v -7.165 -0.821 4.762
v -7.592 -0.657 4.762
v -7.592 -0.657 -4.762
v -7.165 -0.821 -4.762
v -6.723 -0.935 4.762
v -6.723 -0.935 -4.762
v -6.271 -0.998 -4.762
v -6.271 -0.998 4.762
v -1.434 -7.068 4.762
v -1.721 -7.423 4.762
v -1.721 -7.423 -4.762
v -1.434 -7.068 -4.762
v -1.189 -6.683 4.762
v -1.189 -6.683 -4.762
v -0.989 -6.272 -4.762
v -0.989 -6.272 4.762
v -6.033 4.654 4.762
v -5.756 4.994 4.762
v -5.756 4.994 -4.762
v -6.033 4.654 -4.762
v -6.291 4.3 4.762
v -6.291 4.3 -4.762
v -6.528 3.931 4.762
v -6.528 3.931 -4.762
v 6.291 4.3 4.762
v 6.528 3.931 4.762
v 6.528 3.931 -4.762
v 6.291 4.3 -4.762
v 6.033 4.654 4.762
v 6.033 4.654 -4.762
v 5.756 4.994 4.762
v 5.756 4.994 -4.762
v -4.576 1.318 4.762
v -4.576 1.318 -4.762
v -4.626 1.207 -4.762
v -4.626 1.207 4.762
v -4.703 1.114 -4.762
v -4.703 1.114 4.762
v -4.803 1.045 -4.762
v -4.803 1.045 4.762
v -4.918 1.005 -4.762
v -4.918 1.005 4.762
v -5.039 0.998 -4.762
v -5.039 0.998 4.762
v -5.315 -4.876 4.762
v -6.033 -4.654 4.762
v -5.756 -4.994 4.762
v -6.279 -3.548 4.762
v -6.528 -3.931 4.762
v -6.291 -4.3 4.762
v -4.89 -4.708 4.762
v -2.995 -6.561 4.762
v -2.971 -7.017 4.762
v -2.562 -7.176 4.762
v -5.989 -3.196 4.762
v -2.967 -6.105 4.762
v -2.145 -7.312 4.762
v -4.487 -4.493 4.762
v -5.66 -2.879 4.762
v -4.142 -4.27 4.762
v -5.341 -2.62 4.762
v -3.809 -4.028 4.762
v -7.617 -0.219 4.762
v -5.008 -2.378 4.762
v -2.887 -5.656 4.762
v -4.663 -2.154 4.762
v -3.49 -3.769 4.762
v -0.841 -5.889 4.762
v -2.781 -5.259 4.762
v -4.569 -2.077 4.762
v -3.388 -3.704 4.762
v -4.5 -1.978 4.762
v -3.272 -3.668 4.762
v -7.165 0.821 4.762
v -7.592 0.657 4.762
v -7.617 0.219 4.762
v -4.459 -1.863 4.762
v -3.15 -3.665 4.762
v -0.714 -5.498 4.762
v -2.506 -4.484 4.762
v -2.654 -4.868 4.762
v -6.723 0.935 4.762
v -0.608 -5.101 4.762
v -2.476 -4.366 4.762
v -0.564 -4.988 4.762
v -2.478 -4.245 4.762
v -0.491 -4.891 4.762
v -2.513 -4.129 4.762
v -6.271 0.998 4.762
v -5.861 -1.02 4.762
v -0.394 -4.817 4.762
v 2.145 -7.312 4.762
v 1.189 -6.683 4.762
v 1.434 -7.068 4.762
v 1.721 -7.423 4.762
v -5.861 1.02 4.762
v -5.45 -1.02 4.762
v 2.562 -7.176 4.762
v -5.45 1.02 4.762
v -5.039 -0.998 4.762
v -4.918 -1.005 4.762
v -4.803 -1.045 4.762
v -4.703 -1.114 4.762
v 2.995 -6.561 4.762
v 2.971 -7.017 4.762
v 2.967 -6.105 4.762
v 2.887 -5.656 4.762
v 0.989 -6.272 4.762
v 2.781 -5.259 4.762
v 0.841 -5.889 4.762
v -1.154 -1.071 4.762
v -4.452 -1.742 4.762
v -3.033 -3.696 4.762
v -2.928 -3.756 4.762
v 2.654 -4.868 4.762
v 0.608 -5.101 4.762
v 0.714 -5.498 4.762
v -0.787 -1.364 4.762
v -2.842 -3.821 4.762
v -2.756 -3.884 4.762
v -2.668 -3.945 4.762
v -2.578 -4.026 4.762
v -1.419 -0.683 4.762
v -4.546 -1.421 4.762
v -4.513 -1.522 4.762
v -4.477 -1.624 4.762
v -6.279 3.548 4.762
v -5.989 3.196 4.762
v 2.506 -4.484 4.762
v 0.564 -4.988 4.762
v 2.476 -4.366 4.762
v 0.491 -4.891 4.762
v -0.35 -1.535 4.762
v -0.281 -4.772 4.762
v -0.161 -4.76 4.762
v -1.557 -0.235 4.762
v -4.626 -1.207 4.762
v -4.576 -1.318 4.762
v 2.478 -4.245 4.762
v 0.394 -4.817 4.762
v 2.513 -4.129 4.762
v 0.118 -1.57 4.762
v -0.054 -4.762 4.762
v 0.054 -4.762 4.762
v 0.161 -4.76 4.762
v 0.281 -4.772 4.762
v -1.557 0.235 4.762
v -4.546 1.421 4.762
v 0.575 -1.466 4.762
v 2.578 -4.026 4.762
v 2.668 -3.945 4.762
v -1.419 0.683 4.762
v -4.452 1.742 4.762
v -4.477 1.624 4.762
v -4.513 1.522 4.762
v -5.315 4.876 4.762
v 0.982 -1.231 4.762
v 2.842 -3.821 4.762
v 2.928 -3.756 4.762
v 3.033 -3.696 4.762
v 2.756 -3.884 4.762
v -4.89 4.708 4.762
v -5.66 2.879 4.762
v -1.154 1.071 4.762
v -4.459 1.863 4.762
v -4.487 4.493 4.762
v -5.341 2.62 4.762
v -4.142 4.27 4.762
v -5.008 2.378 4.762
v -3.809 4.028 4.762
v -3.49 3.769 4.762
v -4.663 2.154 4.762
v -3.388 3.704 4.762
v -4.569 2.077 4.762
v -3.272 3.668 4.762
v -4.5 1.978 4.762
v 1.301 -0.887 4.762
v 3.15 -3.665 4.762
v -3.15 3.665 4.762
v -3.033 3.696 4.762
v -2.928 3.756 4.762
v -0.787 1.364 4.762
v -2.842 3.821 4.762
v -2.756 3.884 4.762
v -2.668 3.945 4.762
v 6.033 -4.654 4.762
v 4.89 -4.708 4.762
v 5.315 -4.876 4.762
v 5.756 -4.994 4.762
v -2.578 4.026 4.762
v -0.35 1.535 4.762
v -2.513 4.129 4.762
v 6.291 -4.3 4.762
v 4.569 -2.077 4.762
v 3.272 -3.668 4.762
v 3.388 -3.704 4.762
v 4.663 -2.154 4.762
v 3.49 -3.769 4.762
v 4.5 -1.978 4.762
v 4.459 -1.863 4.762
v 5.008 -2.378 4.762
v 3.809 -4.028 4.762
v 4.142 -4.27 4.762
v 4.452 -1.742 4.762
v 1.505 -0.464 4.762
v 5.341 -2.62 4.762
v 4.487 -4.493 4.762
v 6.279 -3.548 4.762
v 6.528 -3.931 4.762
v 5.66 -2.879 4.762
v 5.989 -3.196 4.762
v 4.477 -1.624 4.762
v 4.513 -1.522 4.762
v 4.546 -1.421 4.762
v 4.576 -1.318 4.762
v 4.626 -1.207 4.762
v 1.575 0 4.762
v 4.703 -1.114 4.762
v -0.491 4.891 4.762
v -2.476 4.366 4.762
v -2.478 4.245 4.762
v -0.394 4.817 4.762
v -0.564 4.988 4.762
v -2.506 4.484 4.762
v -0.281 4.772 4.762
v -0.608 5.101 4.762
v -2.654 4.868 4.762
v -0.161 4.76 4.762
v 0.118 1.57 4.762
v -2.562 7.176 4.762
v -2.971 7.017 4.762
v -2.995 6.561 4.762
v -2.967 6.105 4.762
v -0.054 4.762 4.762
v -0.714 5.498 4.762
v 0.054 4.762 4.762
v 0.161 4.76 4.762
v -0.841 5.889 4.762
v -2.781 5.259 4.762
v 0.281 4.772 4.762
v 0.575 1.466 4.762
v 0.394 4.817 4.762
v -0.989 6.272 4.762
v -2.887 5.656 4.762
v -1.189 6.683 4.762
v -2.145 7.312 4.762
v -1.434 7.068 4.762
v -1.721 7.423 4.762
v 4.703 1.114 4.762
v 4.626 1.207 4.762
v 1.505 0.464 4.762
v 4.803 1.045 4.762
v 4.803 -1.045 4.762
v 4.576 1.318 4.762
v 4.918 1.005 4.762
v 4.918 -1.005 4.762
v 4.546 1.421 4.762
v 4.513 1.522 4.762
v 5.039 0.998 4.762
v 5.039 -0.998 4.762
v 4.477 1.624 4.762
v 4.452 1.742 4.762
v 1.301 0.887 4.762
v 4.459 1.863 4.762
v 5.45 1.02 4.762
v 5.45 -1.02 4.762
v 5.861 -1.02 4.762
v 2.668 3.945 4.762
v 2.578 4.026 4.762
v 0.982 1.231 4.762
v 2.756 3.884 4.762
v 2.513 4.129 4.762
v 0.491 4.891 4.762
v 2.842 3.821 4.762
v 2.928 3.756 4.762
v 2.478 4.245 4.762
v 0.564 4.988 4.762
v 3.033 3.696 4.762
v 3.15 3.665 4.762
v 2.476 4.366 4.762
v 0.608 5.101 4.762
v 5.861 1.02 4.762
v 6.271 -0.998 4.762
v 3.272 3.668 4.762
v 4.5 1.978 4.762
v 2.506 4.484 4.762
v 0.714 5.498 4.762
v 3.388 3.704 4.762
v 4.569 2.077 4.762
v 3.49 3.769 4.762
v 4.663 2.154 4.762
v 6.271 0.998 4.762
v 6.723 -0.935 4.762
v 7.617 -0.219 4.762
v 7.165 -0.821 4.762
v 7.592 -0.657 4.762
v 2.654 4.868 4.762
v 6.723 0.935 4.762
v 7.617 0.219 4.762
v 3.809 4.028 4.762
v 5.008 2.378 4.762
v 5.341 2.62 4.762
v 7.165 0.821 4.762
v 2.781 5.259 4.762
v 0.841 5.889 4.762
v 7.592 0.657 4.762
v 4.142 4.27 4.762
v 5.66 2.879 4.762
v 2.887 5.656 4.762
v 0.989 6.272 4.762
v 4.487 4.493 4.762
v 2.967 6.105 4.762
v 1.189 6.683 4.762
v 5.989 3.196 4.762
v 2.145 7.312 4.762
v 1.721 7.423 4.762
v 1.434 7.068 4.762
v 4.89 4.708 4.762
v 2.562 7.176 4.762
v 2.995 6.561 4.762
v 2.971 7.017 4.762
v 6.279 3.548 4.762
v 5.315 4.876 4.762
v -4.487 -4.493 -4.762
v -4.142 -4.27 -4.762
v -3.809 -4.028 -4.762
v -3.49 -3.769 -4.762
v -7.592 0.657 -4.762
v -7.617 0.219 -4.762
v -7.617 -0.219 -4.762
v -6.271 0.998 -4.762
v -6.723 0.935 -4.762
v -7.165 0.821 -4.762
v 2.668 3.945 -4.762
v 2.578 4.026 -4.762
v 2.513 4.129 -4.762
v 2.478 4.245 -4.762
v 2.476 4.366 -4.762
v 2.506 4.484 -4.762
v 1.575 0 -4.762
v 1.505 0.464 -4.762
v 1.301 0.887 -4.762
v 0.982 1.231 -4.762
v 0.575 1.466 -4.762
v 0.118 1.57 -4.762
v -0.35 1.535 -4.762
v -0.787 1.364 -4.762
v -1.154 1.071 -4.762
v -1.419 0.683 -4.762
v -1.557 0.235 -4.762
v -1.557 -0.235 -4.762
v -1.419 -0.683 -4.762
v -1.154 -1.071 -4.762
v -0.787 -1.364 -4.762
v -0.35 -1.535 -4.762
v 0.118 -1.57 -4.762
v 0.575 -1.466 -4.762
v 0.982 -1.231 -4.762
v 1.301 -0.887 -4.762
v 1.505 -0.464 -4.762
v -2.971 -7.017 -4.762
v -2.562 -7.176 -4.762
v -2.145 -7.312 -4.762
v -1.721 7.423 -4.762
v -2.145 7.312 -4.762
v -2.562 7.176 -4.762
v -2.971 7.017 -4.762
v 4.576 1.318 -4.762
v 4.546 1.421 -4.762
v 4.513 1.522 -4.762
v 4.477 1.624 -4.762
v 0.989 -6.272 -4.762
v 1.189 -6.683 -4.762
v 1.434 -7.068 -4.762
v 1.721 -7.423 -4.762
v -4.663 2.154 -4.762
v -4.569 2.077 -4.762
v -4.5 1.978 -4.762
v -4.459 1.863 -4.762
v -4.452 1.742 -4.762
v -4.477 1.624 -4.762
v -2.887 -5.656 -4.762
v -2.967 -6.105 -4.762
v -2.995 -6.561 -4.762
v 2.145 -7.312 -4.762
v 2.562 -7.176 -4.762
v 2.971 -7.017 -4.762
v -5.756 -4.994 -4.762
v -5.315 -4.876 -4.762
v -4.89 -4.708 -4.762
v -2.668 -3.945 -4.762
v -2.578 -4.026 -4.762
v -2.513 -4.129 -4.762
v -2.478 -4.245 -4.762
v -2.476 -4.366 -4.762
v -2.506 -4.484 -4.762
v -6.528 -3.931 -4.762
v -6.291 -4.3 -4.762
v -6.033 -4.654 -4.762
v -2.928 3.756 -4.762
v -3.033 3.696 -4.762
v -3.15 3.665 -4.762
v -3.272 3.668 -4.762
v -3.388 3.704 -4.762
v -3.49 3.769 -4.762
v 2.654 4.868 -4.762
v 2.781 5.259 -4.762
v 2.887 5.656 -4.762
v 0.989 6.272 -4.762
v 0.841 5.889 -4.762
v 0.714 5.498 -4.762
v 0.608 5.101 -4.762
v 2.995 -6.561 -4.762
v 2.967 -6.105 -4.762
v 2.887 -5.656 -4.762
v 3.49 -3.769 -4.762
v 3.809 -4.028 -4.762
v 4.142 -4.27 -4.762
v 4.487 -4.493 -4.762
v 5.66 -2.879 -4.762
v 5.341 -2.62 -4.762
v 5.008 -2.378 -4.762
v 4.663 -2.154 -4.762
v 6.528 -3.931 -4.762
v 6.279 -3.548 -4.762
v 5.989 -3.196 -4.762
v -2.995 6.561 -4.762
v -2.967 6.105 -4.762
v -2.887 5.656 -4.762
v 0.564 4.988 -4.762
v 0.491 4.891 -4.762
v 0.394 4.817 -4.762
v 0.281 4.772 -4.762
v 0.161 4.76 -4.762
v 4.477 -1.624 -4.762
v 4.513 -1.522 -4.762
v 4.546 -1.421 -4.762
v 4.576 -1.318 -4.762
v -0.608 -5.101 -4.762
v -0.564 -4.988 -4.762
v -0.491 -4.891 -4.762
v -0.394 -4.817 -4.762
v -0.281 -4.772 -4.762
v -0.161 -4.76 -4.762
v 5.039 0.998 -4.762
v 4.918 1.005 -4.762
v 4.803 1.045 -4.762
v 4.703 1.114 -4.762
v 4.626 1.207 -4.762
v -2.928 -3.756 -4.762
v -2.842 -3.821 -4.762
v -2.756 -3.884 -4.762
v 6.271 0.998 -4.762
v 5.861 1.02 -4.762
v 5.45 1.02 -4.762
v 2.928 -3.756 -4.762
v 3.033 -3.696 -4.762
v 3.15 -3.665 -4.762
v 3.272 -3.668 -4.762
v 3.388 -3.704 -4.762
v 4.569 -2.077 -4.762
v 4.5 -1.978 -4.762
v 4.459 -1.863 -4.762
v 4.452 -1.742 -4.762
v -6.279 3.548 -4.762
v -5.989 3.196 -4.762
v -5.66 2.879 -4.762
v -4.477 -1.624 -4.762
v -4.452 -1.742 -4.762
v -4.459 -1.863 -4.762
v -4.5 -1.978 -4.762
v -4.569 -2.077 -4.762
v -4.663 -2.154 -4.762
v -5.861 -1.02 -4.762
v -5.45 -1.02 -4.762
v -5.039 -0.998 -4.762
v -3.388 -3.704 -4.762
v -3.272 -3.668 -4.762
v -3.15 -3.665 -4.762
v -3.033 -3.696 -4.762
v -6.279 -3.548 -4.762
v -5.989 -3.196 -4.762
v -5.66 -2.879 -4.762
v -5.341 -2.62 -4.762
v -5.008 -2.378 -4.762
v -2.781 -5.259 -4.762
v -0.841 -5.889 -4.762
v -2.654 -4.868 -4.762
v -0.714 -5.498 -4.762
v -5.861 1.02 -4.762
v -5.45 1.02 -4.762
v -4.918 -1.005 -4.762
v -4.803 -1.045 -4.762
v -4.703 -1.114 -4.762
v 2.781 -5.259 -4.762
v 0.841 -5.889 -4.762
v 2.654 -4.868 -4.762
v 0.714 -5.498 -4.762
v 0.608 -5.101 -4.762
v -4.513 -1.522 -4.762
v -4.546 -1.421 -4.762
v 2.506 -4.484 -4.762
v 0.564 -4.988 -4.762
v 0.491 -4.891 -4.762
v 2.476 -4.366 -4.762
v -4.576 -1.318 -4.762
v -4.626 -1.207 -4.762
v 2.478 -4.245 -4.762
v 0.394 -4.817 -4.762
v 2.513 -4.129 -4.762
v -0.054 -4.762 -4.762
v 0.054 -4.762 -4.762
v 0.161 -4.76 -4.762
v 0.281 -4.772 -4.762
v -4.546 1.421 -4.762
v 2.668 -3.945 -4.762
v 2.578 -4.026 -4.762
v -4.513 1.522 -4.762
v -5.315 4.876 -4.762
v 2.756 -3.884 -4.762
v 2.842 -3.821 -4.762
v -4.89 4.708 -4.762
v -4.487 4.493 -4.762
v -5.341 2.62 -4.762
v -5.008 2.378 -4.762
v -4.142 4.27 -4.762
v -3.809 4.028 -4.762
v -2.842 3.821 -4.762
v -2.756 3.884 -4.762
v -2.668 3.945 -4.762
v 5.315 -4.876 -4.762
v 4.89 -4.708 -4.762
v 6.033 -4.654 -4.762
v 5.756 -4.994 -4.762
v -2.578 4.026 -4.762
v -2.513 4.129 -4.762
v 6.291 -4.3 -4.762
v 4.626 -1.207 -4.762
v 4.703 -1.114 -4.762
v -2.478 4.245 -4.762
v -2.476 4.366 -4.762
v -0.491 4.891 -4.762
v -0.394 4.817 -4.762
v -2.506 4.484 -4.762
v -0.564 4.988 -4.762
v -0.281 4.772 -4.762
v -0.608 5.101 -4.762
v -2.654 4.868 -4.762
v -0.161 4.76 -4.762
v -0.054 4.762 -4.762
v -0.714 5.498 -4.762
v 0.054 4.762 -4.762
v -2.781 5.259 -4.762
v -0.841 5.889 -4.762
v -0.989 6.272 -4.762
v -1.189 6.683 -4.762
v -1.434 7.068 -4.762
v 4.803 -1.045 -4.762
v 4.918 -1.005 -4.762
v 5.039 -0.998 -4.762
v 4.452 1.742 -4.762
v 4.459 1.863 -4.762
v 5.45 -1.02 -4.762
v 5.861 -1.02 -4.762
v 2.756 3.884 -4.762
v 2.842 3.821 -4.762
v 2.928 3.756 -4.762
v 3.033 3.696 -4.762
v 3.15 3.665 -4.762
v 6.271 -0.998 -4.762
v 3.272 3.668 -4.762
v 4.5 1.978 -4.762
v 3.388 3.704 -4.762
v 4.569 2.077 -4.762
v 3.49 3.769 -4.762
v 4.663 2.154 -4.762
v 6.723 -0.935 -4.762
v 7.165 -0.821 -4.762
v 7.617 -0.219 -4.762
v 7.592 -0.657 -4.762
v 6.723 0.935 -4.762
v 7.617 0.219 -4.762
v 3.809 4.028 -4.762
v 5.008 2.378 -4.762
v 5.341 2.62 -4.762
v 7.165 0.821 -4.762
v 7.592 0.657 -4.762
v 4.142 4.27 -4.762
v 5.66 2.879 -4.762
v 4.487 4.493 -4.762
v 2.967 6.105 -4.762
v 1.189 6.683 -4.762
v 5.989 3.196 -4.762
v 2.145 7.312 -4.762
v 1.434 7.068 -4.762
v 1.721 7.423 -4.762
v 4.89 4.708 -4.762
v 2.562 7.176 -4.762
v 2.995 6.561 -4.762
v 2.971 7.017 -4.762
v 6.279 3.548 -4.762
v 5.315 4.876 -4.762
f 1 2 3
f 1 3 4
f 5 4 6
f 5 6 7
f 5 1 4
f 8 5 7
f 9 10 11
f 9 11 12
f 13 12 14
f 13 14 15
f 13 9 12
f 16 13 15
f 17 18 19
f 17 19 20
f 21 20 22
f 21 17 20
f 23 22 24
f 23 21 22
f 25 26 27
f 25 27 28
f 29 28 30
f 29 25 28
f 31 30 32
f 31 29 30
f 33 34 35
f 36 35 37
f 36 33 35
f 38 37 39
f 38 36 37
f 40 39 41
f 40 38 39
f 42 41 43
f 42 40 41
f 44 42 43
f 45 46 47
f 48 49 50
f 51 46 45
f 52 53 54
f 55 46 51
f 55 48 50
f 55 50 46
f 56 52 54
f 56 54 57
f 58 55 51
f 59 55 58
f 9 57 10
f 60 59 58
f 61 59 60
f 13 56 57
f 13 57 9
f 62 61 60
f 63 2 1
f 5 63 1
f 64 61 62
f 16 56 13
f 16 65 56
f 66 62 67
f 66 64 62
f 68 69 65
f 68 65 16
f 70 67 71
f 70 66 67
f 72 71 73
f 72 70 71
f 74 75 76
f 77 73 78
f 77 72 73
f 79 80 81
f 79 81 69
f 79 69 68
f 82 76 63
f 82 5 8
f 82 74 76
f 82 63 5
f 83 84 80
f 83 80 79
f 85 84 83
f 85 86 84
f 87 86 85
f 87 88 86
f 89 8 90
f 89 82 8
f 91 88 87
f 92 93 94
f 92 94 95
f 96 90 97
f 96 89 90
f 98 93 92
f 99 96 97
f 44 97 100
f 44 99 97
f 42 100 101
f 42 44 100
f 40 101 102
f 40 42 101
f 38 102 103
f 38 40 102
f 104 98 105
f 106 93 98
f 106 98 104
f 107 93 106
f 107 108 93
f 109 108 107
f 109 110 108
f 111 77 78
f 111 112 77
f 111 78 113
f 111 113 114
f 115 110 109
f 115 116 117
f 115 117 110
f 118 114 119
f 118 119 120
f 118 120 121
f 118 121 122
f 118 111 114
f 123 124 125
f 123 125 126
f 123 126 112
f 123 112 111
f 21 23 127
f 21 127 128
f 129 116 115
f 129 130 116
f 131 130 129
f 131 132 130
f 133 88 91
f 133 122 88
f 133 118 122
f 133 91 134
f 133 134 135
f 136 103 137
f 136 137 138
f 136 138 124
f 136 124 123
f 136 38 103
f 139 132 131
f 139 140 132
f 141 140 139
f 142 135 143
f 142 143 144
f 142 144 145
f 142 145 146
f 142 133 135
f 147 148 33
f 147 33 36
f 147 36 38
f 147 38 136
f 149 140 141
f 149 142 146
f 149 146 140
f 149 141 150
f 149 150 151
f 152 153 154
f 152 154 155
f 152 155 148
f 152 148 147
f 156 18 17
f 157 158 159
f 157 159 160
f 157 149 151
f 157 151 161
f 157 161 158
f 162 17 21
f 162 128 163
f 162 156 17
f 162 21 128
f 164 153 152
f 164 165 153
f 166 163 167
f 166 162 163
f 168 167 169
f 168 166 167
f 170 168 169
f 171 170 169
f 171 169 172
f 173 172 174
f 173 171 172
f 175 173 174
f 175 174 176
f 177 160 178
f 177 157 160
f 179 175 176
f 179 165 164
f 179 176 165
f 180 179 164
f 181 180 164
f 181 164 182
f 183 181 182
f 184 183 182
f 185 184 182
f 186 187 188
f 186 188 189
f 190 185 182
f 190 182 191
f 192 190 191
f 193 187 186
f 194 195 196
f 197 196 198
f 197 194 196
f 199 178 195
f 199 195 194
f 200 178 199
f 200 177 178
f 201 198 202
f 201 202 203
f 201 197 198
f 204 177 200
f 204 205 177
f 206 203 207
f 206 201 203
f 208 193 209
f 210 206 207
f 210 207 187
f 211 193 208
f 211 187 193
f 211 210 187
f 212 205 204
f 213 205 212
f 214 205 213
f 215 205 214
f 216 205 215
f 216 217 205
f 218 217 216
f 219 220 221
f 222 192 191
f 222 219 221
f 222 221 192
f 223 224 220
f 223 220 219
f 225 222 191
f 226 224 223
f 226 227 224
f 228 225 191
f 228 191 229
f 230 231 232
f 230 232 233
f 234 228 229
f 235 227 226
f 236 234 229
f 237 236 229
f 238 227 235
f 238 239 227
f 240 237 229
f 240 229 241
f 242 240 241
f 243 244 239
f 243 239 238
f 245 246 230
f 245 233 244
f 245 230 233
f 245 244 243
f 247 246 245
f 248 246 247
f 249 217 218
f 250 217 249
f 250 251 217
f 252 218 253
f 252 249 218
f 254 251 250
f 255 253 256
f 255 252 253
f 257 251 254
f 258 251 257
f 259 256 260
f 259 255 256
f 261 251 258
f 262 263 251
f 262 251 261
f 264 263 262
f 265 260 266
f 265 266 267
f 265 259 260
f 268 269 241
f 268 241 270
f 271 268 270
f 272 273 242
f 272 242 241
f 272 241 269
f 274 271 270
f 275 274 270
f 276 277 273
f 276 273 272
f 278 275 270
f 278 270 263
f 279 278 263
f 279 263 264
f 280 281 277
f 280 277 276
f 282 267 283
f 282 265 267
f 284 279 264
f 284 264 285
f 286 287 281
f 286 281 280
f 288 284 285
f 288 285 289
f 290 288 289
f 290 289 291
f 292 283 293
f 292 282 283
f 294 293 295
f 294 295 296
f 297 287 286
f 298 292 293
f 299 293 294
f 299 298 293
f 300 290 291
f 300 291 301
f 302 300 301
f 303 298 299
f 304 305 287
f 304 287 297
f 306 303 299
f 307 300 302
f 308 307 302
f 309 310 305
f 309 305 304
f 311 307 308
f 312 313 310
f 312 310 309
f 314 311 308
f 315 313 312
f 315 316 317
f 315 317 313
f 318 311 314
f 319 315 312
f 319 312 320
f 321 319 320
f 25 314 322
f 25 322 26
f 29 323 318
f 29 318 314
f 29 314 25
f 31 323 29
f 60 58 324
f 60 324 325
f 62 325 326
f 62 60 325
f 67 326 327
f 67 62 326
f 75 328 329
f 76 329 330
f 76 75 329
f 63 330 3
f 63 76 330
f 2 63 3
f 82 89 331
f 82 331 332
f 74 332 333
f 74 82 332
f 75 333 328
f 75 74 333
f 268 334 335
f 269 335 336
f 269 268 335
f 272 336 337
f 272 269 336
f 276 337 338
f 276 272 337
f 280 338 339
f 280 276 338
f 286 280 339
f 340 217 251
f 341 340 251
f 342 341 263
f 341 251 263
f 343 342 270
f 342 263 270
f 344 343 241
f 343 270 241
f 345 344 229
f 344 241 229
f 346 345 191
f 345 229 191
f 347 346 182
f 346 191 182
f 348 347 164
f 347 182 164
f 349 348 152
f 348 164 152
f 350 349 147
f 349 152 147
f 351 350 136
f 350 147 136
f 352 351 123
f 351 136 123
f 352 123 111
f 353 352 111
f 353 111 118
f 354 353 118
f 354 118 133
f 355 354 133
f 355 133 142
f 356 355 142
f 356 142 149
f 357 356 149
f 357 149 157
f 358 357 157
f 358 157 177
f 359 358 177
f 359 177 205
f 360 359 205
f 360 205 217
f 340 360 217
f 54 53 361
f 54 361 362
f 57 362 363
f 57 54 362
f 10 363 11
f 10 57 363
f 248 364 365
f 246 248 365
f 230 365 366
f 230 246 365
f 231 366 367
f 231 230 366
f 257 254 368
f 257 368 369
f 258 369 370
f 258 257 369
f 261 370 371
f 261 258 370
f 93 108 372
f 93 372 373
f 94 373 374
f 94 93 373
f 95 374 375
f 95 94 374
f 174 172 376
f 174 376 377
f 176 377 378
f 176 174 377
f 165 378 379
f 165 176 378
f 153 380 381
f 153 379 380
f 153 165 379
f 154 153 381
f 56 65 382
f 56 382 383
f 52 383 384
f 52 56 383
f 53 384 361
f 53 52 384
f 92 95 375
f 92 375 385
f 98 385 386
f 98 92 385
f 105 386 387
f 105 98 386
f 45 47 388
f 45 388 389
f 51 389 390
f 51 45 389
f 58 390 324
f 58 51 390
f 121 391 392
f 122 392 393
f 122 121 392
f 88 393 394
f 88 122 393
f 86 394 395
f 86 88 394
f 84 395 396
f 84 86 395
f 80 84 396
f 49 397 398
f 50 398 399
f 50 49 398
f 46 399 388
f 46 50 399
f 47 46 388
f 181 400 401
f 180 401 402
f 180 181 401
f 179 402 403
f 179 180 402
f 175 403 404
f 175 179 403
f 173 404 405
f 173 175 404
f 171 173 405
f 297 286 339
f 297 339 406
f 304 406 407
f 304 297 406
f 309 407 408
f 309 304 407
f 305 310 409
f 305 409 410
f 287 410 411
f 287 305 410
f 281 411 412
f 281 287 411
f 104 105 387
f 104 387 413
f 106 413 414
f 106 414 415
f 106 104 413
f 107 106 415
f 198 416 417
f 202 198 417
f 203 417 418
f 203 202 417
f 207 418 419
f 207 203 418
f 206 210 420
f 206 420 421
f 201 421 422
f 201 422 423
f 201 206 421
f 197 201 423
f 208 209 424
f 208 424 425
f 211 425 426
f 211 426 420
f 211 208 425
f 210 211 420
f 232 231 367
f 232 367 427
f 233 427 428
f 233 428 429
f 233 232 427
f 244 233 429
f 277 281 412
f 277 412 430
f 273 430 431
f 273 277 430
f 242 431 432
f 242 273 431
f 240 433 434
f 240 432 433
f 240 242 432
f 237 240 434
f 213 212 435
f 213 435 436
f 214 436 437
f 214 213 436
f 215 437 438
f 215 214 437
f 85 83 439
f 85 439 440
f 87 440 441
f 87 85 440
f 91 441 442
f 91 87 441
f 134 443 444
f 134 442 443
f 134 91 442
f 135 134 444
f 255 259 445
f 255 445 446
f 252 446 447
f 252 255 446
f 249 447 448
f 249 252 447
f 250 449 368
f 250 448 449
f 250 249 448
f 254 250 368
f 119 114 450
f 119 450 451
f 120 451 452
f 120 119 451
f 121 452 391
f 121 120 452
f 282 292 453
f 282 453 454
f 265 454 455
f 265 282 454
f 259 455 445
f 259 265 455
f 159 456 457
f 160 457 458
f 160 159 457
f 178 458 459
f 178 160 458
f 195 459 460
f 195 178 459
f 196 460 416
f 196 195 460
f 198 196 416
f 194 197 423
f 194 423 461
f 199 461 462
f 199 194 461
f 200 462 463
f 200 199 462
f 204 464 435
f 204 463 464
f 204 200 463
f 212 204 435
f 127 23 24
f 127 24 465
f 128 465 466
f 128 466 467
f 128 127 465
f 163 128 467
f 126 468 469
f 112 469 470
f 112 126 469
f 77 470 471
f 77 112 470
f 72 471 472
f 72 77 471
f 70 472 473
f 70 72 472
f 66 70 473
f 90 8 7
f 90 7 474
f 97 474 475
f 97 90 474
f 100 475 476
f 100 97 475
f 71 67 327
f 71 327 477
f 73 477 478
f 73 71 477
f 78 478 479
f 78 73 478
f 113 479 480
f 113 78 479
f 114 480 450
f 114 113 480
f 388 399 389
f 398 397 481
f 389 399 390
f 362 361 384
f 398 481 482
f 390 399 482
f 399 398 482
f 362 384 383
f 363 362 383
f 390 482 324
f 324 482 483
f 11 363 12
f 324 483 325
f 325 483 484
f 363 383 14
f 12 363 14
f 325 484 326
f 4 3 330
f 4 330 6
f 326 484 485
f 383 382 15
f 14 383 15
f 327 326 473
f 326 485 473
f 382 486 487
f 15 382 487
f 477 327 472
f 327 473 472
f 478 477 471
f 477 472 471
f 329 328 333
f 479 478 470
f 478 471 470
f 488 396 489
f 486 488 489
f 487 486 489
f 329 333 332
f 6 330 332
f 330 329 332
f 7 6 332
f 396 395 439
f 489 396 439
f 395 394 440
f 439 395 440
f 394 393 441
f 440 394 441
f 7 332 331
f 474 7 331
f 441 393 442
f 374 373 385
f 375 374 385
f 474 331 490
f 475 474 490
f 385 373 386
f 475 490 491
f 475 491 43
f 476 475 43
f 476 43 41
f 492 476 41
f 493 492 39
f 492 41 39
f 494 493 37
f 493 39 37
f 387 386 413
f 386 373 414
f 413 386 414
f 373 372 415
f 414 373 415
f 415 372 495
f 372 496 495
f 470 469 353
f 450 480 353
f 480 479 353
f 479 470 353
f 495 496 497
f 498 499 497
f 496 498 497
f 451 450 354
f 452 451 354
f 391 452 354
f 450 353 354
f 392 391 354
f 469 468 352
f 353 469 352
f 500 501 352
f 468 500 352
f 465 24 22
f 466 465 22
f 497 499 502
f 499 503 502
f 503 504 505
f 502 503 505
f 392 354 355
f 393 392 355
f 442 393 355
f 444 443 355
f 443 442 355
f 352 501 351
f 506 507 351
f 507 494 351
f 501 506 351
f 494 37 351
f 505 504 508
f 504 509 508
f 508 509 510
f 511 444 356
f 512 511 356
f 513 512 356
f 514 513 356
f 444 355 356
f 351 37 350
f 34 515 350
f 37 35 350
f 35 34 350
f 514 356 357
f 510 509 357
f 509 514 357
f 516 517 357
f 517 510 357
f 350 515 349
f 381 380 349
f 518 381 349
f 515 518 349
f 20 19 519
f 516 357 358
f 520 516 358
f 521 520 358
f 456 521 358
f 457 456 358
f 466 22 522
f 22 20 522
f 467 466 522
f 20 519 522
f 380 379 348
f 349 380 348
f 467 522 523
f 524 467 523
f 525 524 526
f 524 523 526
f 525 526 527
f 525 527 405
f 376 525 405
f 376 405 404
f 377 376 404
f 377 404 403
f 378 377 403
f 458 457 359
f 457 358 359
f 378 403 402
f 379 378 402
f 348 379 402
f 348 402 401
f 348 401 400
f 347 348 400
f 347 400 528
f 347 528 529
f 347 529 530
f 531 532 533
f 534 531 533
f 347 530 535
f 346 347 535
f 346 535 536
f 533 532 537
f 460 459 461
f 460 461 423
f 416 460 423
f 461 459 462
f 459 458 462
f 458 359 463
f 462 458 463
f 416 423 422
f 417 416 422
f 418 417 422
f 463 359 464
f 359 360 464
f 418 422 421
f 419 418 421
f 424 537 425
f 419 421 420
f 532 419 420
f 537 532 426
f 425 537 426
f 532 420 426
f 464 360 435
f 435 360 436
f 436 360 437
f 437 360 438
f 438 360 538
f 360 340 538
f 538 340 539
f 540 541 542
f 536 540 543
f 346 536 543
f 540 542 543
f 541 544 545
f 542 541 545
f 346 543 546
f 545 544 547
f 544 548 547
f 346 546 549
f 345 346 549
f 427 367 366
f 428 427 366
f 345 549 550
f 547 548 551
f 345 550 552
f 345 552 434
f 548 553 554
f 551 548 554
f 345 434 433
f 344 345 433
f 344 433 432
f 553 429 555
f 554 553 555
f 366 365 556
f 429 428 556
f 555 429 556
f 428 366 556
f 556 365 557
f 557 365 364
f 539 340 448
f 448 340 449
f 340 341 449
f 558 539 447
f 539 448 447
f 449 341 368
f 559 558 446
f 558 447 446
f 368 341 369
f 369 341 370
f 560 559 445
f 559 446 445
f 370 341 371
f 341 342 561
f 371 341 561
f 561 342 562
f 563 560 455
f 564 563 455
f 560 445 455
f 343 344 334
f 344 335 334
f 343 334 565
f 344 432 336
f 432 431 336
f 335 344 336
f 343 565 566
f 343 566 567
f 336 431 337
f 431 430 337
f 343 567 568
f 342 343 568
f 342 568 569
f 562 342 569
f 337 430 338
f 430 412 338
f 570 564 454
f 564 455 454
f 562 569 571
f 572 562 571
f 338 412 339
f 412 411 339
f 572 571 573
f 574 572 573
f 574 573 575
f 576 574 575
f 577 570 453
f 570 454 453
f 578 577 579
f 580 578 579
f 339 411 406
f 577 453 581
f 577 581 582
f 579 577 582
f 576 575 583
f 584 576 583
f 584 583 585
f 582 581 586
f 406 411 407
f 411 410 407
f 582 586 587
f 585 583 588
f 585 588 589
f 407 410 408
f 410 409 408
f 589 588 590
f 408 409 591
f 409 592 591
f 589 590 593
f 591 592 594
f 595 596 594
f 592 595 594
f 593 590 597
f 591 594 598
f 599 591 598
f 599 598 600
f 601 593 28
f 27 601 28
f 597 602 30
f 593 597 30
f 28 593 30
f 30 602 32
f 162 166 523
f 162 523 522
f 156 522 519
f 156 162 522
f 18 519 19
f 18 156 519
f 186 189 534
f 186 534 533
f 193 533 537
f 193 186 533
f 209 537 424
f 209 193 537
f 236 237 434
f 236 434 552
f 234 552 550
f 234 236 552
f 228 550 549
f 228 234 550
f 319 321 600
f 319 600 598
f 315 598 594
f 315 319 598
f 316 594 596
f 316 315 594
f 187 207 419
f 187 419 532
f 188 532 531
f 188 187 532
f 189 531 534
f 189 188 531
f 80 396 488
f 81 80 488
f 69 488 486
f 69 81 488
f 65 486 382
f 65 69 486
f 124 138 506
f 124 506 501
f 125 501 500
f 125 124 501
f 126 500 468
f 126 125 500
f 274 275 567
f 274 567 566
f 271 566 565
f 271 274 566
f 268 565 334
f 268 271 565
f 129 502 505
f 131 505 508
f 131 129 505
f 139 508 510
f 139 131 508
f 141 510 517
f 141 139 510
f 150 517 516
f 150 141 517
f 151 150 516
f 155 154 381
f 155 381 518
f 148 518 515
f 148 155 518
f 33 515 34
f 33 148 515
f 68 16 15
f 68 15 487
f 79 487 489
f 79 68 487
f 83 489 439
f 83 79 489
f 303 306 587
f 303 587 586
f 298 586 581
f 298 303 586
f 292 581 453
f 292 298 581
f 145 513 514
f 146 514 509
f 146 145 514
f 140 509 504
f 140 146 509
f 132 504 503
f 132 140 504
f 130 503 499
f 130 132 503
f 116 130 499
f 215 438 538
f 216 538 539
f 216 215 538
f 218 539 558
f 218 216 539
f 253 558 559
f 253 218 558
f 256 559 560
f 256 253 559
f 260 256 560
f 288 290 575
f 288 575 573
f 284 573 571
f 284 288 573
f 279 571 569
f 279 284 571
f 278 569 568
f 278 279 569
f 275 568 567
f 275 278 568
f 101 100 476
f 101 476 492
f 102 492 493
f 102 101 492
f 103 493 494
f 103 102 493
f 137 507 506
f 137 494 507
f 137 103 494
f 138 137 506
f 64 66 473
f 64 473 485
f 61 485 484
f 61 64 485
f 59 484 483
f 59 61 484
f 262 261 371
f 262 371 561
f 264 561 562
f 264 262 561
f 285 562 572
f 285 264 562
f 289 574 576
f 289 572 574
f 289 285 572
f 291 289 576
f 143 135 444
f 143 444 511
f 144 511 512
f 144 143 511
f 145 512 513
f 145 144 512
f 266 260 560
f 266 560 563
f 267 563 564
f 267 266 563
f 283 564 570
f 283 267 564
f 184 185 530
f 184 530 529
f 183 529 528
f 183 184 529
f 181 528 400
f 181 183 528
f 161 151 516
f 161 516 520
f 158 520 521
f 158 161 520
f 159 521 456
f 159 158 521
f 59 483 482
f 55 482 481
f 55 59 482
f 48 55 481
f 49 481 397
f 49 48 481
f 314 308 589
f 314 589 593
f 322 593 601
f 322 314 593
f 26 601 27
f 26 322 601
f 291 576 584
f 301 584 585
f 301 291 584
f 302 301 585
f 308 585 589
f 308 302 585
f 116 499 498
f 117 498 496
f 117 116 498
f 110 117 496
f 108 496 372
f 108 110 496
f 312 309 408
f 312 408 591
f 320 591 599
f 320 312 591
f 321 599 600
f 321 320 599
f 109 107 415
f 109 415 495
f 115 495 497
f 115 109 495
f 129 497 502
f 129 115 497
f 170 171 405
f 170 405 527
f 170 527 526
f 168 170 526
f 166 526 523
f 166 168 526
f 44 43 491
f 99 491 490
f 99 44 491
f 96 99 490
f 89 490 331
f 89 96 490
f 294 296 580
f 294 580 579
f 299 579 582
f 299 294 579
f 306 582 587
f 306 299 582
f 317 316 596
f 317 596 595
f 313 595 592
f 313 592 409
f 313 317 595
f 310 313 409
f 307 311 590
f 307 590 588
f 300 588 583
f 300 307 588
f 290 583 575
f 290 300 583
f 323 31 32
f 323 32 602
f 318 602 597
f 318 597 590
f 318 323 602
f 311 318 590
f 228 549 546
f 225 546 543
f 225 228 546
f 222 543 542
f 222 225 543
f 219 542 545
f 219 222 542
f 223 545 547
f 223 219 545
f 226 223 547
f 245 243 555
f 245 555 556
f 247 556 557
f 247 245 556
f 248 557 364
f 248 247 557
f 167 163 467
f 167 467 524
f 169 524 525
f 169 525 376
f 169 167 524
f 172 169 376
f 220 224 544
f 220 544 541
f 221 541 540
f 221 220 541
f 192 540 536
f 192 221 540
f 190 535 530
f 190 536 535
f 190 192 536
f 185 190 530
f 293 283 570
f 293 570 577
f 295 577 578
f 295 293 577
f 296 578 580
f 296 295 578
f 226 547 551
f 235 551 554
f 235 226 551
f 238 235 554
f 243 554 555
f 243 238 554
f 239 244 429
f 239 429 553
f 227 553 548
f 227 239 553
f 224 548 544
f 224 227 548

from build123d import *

# Parameters (mm, degrees)
SKETCH1_R           = 7.62
ROUND_STOCK_DEPTH   = 4.7625
SINGLE_TOOTH_DEPTH  = 15.382434599
TOOTH_PATTERN_COUNT = 10
SKETCH5_R           = 1.5748
CUT_EXTRUDE1_DEPTH  = 15.279088802


with BuildPart() as part:
    # Sketch1 → Round Stock (new, symmetric)
    with BuildSketch(Plane.XY):
        Circle(SKETCH1_R)
    extrude(amount=ROUND_STOCK_DEPTH, both=True)

    # Sketch2 → Single Tooth (cut, through all)
    with BuildSketch(Plane.XY.offset(4.7625)):
        with BuildLine():
            ThreePointArc((-6.527946851, -3.930688223), (-7.247050654, -2.354709497), (-7.59162051, -0.657037315))
            ThreePointArc((-7.59162051, -0.657037315), (-6.946040634, -0.884136963), (-6.271150147, -0.997585))
            ThreePointArc((-6.271150147, -0.997585), (-5.655082128, -1.02259203), (-5.038991647, -0.998144603))
            ThreePointArc((-5.038991647, -0.998144603), (-4.750649746, -1.075701008), (-4.576435033, -1.318199012))
            ThreePointArc((-4.576435033, -1.318199012), (-4.529406659, -1.471693436), (-4.477231654, -1.623515618))
            ThreePointArc((-4.477231654, -1.623515618), (-4.475637567, -1.922101463), (-4.663324555, -2.15432903))
            ThreePointArc((-4.663324555, -2.15432903), (-5.17612206, -2.496679544), (-5.659832794, -2.879026353))
            ThreePointArc((-5.659832794, -2.879026353), (-6.139147584, -3.367498418), (-6.527946851, -3.930688223))
        make_face()
    single_tooth = extrude(amount=-SINGLE_TOOTH_DEPTH, mode=Mode.SUBTRACT)

    # Tooth Pattern: Single Tooth ×10 about axis
    tooth_pattern_axis = Axis((0, 0, 50), (0, 0, -1))
    for i in range(1, TOOTH_PATTERN_COUNT):
        add(single_tooth.rotate(tooth_pattern_axis, i * 360 / TOOTH_PATTERN_COUNT), mode=Mode.SUBTRACT)

    # Sketch5 → Cut-Extrude1 (cut, through all)
    with BuildSketch(Plane.XY.offset(4.7625)):
        Circle(SKETCH5_R)
    extrude(amount=-CUT_EXTRUDE1_DEPTH, mode=Mode.SUBTRACT)


solid = part.part
